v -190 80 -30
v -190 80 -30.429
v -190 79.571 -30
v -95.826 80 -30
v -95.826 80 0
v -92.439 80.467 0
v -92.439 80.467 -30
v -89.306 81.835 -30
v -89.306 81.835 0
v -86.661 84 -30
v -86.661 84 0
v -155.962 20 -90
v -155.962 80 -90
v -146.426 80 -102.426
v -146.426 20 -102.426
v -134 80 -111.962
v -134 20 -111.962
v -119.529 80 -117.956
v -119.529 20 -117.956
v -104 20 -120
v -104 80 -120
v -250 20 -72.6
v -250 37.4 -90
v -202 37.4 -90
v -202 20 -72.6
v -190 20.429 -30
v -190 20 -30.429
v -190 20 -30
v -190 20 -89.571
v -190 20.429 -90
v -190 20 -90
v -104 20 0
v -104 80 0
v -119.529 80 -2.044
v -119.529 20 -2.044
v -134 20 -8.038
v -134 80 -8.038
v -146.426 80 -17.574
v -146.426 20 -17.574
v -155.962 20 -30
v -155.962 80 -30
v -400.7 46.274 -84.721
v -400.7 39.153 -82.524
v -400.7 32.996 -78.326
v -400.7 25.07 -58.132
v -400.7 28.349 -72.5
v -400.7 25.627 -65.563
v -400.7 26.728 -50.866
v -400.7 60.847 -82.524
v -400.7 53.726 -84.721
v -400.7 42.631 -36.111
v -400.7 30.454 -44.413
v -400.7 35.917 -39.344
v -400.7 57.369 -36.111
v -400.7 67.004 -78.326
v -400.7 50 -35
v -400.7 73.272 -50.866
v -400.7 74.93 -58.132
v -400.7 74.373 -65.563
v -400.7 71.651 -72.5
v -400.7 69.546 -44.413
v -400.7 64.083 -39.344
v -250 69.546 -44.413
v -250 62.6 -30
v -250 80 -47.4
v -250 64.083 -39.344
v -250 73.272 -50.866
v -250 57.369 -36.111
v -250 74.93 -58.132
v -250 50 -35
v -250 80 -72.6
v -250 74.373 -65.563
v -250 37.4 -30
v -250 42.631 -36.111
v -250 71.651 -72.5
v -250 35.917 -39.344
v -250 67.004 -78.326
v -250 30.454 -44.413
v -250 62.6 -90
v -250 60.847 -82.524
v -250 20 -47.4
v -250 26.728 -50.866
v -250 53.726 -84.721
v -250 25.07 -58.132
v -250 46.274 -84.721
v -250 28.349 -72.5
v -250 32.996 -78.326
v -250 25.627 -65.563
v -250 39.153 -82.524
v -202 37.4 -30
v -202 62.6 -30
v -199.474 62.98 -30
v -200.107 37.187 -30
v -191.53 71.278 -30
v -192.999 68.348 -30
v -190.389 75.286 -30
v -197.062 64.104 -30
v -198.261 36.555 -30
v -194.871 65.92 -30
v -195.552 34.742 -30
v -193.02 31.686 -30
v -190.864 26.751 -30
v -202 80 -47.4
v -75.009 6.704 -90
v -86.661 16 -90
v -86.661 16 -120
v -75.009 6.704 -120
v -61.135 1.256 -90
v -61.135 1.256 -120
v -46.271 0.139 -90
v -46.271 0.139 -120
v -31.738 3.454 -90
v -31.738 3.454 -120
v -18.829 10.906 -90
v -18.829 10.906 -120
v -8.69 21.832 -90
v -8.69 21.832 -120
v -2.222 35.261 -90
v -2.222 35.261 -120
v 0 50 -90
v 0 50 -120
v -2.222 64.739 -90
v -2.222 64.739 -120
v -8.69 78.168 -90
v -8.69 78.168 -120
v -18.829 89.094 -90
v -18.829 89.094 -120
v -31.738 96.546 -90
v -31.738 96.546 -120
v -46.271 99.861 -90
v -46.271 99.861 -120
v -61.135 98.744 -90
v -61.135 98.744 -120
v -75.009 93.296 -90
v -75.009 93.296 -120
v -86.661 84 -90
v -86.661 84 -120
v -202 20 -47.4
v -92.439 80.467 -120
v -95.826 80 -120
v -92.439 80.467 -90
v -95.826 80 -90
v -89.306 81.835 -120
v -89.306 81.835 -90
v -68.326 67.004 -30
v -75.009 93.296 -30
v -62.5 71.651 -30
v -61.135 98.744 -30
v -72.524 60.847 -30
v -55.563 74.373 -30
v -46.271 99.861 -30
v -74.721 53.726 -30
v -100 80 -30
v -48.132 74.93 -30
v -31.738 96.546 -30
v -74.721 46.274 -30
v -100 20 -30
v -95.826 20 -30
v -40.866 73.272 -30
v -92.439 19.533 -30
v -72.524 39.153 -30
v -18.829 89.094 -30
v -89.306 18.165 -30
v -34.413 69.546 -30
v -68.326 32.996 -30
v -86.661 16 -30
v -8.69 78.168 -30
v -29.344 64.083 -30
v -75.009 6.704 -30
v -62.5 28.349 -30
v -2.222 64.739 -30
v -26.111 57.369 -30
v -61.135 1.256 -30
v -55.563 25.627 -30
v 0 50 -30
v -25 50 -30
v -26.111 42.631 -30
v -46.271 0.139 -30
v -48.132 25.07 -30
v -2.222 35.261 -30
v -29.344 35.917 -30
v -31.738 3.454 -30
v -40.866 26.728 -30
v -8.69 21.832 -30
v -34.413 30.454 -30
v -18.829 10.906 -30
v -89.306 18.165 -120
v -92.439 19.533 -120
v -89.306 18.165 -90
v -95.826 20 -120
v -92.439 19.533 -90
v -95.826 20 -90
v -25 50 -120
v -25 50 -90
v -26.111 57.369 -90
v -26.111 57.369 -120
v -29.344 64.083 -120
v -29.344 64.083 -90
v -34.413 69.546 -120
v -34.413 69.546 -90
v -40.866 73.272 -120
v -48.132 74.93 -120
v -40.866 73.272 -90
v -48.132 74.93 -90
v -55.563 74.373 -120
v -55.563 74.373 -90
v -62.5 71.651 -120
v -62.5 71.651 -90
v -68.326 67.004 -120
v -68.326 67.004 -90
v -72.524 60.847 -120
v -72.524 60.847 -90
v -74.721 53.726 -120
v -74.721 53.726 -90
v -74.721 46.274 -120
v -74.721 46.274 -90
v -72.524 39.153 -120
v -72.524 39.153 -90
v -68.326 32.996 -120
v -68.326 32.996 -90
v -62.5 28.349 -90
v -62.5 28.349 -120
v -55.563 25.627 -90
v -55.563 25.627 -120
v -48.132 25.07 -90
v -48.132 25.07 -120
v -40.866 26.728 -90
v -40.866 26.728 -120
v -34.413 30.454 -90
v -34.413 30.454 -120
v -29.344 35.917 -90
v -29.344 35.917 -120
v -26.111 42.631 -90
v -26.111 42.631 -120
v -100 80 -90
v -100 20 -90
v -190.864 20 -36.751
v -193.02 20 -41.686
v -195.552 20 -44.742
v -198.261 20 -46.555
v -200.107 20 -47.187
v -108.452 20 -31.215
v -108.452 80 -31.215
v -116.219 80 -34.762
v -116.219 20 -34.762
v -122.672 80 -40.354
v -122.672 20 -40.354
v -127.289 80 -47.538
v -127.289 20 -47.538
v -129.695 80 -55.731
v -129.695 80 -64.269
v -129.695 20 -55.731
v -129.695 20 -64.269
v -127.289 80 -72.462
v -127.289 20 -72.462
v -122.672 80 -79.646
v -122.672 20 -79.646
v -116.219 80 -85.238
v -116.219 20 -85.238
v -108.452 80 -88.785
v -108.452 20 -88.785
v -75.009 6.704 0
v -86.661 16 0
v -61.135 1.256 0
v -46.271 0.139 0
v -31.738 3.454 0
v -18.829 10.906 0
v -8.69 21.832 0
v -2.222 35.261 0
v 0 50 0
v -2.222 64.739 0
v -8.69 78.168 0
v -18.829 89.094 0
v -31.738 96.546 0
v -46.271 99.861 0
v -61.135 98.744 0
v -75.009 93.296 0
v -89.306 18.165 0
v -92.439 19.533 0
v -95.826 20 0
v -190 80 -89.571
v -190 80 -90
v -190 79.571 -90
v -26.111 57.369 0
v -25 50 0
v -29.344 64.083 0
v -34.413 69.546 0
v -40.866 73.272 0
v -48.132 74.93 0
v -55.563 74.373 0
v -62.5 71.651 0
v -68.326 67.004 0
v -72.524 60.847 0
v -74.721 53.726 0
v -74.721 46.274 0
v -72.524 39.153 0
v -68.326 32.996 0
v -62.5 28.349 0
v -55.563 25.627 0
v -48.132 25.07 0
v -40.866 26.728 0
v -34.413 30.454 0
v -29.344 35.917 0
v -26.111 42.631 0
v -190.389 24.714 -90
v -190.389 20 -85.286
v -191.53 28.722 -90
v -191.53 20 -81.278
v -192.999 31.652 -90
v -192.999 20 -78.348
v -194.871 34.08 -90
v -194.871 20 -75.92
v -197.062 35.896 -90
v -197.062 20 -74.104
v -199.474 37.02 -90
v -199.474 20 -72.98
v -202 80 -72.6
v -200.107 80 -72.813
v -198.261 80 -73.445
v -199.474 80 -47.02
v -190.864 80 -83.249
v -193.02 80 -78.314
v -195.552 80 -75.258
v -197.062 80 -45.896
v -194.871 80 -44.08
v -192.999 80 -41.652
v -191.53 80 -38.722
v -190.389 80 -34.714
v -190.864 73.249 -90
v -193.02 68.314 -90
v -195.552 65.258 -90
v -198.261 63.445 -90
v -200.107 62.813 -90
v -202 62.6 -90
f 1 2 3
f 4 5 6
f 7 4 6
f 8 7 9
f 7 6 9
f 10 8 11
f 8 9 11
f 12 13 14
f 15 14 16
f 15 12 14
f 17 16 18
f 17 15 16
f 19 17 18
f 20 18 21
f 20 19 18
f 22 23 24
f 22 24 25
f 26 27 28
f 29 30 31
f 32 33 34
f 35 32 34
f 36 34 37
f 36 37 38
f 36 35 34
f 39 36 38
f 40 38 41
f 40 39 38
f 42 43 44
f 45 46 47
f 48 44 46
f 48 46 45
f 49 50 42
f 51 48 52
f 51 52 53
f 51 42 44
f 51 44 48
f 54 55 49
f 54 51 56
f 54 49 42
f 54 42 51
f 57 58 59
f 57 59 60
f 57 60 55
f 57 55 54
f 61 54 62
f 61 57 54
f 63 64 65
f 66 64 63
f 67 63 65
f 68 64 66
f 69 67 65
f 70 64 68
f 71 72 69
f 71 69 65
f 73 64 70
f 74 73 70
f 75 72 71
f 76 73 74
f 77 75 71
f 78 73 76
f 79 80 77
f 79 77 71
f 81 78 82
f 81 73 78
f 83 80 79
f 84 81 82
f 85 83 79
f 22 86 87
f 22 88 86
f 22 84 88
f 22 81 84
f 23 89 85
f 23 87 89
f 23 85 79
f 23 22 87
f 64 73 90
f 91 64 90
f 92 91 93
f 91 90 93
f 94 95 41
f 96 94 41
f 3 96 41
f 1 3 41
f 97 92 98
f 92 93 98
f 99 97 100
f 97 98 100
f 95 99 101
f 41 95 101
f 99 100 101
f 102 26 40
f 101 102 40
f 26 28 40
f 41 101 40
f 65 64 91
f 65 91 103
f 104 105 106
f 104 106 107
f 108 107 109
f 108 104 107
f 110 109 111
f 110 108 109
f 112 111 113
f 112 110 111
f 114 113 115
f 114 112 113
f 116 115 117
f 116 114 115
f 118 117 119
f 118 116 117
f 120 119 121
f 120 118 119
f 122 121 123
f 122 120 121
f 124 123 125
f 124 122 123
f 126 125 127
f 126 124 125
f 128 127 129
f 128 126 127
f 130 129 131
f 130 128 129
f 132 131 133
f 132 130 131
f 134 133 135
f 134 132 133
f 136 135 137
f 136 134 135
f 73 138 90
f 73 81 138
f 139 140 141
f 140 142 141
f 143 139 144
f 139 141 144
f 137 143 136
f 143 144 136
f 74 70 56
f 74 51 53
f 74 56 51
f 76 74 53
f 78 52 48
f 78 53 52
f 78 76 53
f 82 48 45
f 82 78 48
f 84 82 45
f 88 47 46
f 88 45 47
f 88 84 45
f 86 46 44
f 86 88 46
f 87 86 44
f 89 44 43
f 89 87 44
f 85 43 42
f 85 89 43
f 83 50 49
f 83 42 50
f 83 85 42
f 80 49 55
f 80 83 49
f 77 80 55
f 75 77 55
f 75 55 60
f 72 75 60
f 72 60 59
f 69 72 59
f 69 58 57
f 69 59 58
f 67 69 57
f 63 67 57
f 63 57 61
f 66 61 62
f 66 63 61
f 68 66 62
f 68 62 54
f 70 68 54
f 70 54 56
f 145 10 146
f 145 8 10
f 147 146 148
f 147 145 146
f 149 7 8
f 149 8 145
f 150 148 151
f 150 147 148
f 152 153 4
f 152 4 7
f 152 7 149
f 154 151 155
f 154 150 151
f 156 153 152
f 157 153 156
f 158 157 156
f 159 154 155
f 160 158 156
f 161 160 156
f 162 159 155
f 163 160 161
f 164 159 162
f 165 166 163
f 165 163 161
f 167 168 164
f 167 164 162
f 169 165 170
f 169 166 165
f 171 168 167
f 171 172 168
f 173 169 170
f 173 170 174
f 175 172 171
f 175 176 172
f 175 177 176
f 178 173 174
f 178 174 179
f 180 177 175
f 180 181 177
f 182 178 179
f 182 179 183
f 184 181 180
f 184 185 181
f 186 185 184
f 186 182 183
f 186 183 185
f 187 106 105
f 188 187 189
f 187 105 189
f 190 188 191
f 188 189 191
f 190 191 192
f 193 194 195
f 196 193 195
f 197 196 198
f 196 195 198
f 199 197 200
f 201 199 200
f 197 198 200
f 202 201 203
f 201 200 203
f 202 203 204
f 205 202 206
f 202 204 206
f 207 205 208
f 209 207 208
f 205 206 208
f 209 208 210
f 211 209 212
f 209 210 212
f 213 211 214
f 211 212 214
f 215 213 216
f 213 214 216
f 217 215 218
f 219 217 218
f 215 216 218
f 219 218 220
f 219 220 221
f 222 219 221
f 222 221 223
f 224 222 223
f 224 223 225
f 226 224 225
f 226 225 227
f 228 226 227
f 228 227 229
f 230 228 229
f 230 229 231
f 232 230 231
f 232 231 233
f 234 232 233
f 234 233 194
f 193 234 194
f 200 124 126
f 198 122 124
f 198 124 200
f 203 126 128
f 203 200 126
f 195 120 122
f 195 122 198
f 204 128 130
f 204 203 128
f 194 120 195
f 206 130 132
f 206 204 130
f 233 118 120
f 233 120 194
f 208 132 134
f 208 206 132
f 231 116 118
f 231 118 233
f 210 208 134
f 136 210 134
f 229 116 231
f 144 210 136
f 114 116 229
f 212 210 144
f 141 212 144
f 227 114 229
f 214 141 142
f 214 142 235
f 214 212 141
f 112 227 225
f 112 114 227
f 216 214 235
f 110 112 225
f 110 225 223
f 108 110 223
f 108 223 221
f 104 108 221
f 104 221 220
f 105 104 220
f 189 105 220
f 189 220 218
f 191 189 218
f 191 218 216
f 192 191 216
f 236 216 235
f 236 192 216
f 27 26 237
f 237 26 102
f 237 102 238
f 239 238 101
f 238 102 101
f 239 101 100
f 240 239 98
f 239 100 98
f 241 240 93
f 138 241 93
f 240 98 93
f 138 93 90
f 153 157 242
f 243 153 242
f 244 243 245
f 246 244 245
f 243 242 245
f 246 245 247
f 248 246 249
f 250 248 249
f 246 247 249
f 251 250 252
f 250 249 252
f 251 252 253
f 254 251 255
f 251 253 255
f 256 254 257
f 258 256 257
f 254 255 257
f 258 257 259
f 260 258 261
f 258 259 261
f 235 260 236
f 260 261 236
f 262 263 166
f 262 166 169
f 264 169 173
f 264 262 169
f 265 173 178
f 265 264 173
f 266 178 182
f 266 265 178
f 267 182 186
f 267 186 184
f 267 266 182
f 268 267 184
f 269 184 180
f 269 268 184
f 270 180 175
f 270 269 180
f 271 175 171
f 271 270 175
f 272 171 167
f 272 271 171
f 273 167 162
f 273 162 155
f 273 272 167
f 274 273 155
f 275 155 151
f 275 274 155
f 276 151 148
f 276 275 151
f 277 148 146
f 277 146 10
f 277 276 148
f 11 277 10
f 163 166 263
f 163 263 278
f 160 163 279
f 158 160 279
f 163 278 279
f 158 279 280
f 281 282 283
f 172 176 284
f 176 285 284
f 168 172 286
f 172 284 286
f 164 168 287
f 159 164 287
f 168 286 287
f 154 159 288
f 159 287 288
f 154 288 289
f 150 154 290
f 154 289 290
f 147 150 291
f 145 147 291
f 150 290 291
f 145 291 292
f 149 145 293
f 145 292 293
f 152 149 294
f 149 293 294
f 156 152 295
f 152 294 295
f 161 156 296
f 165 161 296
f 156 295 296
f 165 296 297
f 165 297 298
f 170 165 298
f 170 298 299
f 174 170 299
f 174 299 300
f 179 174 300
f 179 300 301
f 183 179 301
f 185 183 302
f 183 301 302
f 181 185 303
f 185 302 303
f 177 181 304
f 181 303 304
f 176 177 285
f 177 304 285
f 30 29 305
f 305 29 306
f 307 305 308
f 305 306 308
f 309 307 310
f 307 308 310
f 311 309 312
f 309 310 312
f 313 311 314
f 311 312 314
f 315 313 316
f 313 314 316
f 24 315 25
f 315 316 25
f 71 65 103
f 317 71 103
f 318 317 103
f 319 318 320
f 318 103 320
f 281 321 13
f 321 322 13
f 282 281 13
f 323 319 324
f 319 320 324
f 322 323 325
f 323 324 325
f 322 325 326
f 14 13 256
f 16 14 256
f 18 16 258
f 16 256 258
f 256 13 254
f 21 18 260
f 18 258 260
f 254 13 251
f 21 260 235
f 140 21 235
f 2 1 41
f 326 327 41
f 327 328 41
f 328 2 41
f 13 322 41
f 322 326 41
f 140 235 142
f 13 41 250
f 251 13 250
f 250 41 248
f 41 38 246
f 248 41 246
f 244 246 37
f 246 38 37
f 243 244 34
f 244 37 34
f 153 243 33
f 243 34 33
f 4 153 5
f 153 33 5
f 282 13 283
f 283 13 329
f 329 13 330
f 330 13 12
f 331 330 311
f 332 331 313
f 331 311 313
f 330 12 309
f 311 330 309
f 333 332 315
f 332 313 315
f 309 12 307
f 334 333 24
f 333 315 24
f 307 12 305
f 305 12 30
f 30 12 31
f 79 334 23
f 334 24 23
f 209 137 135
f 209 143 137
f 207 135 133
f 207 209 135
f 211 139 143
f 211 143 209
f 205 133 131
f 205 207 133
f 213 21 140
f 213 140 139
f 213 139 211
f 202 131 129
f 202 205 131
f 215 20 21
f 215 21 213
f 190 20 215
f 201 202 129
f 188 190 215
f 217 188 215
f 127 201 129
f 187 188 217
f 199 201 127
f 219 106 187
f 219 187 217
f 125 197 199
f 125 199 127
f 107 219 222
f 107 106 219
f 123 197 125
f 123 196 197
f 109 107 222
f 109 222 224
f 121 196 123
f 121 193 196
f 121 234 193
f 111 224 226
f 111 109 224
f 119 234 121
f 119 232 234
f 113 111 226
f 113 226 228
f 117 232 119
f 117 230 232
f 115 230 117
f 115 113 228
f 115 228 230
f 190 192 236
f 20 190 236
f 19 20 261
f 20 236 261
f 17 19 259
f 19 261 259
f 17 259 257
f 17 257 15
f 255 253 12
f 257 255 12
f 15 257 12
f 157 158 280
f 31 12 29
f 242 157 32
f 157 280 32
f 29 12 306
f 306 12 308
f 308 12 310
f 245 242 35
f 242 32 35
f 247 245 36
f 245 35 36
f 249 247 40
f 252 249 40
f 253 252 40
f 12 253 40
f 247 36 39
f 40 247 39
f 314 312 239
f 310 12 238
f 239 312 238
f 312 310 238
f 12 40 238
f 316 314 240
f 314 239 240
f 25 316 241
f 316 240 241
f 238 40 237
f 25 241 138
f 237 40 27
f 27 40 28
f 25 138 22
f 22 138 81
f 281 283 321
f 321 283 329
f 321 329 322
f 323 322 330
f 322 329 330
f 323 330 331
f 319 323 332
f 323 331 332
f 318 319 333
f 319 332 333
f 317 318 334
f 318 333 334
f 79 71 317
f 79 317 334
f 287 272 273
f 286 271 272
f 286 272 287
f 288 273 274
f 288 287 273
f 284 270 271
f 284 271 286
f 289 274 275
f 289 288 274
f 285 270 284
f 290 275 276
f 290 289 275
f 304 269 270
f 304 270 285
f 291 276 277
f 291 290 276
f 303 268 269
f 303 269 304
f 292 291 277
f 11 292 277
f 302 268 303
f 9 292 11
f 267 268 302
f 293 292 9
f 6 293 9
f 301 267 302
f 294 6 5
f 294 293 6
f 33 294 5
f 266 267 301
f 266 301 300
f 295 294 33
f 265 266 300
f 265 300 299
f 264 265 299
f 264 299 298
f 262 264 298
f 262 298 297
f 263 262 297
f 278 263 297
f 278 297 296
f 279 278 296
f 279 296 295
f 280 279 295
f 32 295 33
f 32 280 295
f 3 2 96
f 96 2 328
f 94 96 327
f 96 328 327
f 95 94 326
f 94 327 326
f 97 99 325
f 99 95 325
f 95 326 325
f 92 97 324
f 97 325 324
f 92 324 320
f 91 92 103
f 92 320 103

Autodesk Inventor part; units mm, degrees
ref_plane "YZ Plane" through (0, 0, 0) normal (1, 0, 0) x (0, 1, 0)
ref_plane "XZ Plane" through (0, 0, 0) normal (0, 1, 0) x (-1, 0, 0)
ref_plane "XY Plane" through (0, 0, 0) normal (0, 0, 1) x (1, 0, 0)
sketch "Boceto1" plane through (0, 0, 0) normal (0, 0, 1) x (1, 0, 0)
  point P0 (0, 0)
sketch "Boceto2" plane through (0, 0, 0) normal (0, 1, 0) x (-1, 0, 0)
  line L0 (0, 0) -> (104, 0)
  line L1 (250, -30) -> (250, -90)
  line L2 (104, -120) -> (0, -120)
  arc A0 (100, -90) -> (100, -30) centre (100, -60) ccw
  line L3 (250, -60) -> (250, -30)
  arc A1 (155.9615, -30) -> (104, 0) centre (104, -60) ccw
  arc A2 (104, -120) -> (155.9615, -90) centre (104, -60) ccw
  line L4 (0, -120) -> (0, -90)
  line L5 (0, -30) -> (0, 0)
  line L6 (0, -90) -> (100, -90)
  line L7 (155.9615, -90) -> (250, -90)
  line L8 (250, -30) -> (155.9615, -30)
  line L9 (100, -30) -> (0, -30)
  dimension "d2" = 60
  dimension "d3" = 150
  dimension "d4" = 4
extrude "Extrusión1" add sketch "Boceto2" along normal blind 100
sketch "Boceto3" plane through (-104, 0, 0) normal (0, 0, 1) x (1, 0, 0)
  arc A0 (17.3394, 16) -> (17.3394, 84) centre (54, 50) ccw
  line L0 (0, 100) -> (104, 100) projected
  line L1 (104, 0) -> (104, 100) projected
  line L2 (0, 0) -> (104, 0) projected
  circle A1 centre (54, 50) radius 25
  line L3 (-146, 80) -> (8.1742, 80)
  line L4 (8.1742, 20) -> (-146, 20)
  arc A2 (17.3394, 16) -> (8.1742, 20) centre (8.1742, 7.5) ccw
  arc A3 (8.1742, 80) -> (17.3394, 84) centre (8.1742, 92.5) ccw
  line L5 (-146, 80) -> (-146, 20)
  line L6 (-146, 0) -> (-146, 100) projected
  line L7 (-146, 0) -> (-51.9615, 0) projected
  line L8 (-146, 100) -> (-51.9615, 100) projected
  dimension "d7" = 50
  dimension "d9" = 25
  dimension "d10" = 25
  dimension "d11" = 60
  dimension "d12" = 20
  dimension "d13" = 20
extrude "Extrusión2" cut sketch "Boceto3" against normal blind 200 contours A2 L4 L5 L3 A3 A0 keep common part
sketch "Boceto4" plane through (-250, 20, -30) normal (-1, 0, 0) x (0, 0, 1)
  line L0 (-60, 60) -> (0, 60) projected
  line L1 (0, 60) -> (-17.4, 60)
  line L2 (0, 60) -> (0, 42.6)
  line L3 (0, 0) -> (0, 60) projected
  line L4 (0, 42.6) -> (-17.4, 60)
  line L5 (-42.6, 60) -> (-60, 42.6)
  line L6 (-60, 60) -> (-60, 42.6)
  line L7 (-60, 60) -> (-42.6, 60)
  line L8 (-60, 17.4) -> (-42.6, 0)
  line L9 (-60, 0) -> (-42.6, 0)
  line L10 (-60, 0) -> (-60, 17.4)
  line L11 (-17.4, 0) -> (0, 17.4)
  line L12 (0, 0) -> (0, 17.4)
  line L13 (0, 0) -> (-17.4, 0)
  point P0 (30, -20)
  point P1 (-30, 30)
  dimension "d16" = 17.4
  dimension "d17" = 17.4
  dimension "d20" = 360
extrude "Extrusión3" cut sketch "Boceto4" against normal blind 60
sketch "Boceto6" plane through (-250, 37.4, -30) normal (-1, 0, 0) x (0, 0, 1)
  circle A0 centre (-30, 12.6) radius 25
  line L0 (0, 0) -> (0, 25.2) projected
  line L1 (-17.4, -17.4) -> (-42.6, -17.4) projected
  point P0 (30, -37.4)
  dimension "d24" = 50
  dimension "d25" = 30
  dimension "d26" = 30
fillet "Empalme1" radius 12 4 edges at (-190, 71.3, -38.7) (-190, 71.3, -81.3) (-190, 28.7, -81.3) (-190, 28.7, -38.7)
extrude "Extrusión4" add sketch "Boceto6" along normal blind 150.7
properties part number "Fork end" material "Plástico PC/ABS"
